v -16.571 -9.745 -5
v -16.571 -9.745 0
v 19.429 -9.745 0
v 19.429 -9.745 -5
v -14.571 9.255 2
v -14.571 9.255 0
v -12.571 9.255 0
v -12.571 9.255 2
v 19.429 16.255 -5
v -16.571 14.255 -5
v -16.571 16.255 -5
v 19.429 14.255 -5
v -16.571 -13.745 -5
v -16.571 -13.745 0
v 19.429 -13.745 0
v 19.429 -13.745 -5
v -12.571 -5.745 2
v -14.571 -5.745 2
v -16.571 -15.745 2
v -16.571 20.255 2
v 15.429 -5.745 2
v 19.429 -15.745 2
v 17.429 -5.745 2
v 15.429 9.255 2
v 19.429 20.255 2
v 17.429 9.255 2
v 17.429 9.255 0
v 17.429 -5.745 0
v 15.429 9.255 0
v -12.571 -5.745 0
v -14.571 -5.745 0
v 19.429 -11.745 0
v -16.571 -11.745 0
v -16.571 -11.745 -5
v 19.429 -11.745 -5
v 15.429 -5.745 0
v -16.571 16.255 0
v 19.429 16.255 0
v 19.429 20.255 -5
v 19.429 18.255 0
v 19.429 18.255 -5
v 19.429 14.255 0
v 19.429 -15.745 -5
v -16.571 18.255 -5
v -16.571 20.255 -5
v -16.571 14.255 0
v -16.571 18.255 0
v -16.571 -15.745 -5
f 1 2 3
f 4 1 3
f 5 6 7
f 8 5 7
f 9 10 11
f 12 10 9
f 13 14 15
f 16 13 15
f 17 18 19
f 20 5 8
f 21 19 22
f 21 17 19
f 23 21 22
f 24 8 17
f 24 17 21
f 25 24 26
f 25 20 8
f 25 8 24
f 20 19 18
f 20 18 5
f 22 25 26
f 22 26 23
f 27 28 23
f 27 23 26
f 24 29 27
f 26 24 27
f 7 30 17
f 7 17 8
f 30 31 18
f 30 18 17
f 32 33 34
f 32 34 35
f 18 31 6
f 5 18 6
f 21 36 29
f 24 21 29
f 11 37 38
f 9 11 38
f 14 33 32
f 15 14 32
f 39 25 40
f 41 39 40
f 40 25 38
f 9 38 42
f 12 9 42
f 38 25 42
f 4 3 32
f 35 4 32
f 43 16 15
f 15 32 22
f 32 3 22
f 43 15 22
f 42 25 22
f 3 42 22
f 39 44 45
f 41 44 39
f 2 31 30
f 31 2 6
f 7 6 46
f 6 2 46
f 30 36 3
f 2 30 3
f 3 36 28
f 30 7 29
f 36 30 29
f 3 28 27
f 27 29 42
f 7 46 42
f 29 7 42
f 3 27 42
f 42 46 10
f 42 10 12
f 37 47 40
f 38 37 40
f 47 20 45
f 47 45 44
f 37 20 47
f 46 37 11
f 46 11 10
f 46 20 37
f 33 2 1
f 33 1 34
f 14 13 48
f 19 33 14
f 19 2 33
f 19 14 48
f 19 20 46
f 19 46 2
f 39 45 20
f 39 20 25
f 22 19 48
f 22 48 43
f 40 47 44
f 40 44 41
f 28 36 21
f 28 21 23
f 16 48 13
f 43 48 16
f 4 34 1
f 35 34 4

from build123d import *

# Parameters (mm, degrees)
F0_W     = 36
F0_H     = 36
F0_W_2   = 2
F0_H_2   = 15
F1_DEPTH = 2
F2_W     = 36
F2_H     = 2
F3_DEPTH = 5


with BuildPart() as f1:
    # F0 (on Top) → F1 (new body)
    with BuildSketch(Plane.XY):
        with Locations((1.428571, 2.255185)):
            Rectangle(F0_W, F0_H)
        with Locations((-13.571429, 1.755185)):
            Rectangle(F0_W_2, F0_H_2, mode=Mode.SUBTRACT)
        with Locations((16.428571, 1.755185)):
            Rectangle(F0_W_2, F0_H_2, mode=Mode.SUBTRACT)
    extrude(amount=F1_DEPTH)

    # F2 (on face) → F3 (join)
    with BuildSketch(Plane(origin=(0, 0, 0), x_dir=(1, 0, 0), z_dir=(0, 0, -1))):
        with Locations((1.428571, 14.744815)):
            Rectangle(F2_W, F2_H)
        with Locations((1.428571, 10.744815)):
            Rectangle(F2_W, F2_H)
        with Locations((1.428571, -19.255185)):
            Rectangle(F2_W, F2_H)
        with Locations((1.428571, -15.255185)):
            Rectangle(F2_W, F2_H)
    extrude(amount=F3_DEPTH)


solid = f1.part
